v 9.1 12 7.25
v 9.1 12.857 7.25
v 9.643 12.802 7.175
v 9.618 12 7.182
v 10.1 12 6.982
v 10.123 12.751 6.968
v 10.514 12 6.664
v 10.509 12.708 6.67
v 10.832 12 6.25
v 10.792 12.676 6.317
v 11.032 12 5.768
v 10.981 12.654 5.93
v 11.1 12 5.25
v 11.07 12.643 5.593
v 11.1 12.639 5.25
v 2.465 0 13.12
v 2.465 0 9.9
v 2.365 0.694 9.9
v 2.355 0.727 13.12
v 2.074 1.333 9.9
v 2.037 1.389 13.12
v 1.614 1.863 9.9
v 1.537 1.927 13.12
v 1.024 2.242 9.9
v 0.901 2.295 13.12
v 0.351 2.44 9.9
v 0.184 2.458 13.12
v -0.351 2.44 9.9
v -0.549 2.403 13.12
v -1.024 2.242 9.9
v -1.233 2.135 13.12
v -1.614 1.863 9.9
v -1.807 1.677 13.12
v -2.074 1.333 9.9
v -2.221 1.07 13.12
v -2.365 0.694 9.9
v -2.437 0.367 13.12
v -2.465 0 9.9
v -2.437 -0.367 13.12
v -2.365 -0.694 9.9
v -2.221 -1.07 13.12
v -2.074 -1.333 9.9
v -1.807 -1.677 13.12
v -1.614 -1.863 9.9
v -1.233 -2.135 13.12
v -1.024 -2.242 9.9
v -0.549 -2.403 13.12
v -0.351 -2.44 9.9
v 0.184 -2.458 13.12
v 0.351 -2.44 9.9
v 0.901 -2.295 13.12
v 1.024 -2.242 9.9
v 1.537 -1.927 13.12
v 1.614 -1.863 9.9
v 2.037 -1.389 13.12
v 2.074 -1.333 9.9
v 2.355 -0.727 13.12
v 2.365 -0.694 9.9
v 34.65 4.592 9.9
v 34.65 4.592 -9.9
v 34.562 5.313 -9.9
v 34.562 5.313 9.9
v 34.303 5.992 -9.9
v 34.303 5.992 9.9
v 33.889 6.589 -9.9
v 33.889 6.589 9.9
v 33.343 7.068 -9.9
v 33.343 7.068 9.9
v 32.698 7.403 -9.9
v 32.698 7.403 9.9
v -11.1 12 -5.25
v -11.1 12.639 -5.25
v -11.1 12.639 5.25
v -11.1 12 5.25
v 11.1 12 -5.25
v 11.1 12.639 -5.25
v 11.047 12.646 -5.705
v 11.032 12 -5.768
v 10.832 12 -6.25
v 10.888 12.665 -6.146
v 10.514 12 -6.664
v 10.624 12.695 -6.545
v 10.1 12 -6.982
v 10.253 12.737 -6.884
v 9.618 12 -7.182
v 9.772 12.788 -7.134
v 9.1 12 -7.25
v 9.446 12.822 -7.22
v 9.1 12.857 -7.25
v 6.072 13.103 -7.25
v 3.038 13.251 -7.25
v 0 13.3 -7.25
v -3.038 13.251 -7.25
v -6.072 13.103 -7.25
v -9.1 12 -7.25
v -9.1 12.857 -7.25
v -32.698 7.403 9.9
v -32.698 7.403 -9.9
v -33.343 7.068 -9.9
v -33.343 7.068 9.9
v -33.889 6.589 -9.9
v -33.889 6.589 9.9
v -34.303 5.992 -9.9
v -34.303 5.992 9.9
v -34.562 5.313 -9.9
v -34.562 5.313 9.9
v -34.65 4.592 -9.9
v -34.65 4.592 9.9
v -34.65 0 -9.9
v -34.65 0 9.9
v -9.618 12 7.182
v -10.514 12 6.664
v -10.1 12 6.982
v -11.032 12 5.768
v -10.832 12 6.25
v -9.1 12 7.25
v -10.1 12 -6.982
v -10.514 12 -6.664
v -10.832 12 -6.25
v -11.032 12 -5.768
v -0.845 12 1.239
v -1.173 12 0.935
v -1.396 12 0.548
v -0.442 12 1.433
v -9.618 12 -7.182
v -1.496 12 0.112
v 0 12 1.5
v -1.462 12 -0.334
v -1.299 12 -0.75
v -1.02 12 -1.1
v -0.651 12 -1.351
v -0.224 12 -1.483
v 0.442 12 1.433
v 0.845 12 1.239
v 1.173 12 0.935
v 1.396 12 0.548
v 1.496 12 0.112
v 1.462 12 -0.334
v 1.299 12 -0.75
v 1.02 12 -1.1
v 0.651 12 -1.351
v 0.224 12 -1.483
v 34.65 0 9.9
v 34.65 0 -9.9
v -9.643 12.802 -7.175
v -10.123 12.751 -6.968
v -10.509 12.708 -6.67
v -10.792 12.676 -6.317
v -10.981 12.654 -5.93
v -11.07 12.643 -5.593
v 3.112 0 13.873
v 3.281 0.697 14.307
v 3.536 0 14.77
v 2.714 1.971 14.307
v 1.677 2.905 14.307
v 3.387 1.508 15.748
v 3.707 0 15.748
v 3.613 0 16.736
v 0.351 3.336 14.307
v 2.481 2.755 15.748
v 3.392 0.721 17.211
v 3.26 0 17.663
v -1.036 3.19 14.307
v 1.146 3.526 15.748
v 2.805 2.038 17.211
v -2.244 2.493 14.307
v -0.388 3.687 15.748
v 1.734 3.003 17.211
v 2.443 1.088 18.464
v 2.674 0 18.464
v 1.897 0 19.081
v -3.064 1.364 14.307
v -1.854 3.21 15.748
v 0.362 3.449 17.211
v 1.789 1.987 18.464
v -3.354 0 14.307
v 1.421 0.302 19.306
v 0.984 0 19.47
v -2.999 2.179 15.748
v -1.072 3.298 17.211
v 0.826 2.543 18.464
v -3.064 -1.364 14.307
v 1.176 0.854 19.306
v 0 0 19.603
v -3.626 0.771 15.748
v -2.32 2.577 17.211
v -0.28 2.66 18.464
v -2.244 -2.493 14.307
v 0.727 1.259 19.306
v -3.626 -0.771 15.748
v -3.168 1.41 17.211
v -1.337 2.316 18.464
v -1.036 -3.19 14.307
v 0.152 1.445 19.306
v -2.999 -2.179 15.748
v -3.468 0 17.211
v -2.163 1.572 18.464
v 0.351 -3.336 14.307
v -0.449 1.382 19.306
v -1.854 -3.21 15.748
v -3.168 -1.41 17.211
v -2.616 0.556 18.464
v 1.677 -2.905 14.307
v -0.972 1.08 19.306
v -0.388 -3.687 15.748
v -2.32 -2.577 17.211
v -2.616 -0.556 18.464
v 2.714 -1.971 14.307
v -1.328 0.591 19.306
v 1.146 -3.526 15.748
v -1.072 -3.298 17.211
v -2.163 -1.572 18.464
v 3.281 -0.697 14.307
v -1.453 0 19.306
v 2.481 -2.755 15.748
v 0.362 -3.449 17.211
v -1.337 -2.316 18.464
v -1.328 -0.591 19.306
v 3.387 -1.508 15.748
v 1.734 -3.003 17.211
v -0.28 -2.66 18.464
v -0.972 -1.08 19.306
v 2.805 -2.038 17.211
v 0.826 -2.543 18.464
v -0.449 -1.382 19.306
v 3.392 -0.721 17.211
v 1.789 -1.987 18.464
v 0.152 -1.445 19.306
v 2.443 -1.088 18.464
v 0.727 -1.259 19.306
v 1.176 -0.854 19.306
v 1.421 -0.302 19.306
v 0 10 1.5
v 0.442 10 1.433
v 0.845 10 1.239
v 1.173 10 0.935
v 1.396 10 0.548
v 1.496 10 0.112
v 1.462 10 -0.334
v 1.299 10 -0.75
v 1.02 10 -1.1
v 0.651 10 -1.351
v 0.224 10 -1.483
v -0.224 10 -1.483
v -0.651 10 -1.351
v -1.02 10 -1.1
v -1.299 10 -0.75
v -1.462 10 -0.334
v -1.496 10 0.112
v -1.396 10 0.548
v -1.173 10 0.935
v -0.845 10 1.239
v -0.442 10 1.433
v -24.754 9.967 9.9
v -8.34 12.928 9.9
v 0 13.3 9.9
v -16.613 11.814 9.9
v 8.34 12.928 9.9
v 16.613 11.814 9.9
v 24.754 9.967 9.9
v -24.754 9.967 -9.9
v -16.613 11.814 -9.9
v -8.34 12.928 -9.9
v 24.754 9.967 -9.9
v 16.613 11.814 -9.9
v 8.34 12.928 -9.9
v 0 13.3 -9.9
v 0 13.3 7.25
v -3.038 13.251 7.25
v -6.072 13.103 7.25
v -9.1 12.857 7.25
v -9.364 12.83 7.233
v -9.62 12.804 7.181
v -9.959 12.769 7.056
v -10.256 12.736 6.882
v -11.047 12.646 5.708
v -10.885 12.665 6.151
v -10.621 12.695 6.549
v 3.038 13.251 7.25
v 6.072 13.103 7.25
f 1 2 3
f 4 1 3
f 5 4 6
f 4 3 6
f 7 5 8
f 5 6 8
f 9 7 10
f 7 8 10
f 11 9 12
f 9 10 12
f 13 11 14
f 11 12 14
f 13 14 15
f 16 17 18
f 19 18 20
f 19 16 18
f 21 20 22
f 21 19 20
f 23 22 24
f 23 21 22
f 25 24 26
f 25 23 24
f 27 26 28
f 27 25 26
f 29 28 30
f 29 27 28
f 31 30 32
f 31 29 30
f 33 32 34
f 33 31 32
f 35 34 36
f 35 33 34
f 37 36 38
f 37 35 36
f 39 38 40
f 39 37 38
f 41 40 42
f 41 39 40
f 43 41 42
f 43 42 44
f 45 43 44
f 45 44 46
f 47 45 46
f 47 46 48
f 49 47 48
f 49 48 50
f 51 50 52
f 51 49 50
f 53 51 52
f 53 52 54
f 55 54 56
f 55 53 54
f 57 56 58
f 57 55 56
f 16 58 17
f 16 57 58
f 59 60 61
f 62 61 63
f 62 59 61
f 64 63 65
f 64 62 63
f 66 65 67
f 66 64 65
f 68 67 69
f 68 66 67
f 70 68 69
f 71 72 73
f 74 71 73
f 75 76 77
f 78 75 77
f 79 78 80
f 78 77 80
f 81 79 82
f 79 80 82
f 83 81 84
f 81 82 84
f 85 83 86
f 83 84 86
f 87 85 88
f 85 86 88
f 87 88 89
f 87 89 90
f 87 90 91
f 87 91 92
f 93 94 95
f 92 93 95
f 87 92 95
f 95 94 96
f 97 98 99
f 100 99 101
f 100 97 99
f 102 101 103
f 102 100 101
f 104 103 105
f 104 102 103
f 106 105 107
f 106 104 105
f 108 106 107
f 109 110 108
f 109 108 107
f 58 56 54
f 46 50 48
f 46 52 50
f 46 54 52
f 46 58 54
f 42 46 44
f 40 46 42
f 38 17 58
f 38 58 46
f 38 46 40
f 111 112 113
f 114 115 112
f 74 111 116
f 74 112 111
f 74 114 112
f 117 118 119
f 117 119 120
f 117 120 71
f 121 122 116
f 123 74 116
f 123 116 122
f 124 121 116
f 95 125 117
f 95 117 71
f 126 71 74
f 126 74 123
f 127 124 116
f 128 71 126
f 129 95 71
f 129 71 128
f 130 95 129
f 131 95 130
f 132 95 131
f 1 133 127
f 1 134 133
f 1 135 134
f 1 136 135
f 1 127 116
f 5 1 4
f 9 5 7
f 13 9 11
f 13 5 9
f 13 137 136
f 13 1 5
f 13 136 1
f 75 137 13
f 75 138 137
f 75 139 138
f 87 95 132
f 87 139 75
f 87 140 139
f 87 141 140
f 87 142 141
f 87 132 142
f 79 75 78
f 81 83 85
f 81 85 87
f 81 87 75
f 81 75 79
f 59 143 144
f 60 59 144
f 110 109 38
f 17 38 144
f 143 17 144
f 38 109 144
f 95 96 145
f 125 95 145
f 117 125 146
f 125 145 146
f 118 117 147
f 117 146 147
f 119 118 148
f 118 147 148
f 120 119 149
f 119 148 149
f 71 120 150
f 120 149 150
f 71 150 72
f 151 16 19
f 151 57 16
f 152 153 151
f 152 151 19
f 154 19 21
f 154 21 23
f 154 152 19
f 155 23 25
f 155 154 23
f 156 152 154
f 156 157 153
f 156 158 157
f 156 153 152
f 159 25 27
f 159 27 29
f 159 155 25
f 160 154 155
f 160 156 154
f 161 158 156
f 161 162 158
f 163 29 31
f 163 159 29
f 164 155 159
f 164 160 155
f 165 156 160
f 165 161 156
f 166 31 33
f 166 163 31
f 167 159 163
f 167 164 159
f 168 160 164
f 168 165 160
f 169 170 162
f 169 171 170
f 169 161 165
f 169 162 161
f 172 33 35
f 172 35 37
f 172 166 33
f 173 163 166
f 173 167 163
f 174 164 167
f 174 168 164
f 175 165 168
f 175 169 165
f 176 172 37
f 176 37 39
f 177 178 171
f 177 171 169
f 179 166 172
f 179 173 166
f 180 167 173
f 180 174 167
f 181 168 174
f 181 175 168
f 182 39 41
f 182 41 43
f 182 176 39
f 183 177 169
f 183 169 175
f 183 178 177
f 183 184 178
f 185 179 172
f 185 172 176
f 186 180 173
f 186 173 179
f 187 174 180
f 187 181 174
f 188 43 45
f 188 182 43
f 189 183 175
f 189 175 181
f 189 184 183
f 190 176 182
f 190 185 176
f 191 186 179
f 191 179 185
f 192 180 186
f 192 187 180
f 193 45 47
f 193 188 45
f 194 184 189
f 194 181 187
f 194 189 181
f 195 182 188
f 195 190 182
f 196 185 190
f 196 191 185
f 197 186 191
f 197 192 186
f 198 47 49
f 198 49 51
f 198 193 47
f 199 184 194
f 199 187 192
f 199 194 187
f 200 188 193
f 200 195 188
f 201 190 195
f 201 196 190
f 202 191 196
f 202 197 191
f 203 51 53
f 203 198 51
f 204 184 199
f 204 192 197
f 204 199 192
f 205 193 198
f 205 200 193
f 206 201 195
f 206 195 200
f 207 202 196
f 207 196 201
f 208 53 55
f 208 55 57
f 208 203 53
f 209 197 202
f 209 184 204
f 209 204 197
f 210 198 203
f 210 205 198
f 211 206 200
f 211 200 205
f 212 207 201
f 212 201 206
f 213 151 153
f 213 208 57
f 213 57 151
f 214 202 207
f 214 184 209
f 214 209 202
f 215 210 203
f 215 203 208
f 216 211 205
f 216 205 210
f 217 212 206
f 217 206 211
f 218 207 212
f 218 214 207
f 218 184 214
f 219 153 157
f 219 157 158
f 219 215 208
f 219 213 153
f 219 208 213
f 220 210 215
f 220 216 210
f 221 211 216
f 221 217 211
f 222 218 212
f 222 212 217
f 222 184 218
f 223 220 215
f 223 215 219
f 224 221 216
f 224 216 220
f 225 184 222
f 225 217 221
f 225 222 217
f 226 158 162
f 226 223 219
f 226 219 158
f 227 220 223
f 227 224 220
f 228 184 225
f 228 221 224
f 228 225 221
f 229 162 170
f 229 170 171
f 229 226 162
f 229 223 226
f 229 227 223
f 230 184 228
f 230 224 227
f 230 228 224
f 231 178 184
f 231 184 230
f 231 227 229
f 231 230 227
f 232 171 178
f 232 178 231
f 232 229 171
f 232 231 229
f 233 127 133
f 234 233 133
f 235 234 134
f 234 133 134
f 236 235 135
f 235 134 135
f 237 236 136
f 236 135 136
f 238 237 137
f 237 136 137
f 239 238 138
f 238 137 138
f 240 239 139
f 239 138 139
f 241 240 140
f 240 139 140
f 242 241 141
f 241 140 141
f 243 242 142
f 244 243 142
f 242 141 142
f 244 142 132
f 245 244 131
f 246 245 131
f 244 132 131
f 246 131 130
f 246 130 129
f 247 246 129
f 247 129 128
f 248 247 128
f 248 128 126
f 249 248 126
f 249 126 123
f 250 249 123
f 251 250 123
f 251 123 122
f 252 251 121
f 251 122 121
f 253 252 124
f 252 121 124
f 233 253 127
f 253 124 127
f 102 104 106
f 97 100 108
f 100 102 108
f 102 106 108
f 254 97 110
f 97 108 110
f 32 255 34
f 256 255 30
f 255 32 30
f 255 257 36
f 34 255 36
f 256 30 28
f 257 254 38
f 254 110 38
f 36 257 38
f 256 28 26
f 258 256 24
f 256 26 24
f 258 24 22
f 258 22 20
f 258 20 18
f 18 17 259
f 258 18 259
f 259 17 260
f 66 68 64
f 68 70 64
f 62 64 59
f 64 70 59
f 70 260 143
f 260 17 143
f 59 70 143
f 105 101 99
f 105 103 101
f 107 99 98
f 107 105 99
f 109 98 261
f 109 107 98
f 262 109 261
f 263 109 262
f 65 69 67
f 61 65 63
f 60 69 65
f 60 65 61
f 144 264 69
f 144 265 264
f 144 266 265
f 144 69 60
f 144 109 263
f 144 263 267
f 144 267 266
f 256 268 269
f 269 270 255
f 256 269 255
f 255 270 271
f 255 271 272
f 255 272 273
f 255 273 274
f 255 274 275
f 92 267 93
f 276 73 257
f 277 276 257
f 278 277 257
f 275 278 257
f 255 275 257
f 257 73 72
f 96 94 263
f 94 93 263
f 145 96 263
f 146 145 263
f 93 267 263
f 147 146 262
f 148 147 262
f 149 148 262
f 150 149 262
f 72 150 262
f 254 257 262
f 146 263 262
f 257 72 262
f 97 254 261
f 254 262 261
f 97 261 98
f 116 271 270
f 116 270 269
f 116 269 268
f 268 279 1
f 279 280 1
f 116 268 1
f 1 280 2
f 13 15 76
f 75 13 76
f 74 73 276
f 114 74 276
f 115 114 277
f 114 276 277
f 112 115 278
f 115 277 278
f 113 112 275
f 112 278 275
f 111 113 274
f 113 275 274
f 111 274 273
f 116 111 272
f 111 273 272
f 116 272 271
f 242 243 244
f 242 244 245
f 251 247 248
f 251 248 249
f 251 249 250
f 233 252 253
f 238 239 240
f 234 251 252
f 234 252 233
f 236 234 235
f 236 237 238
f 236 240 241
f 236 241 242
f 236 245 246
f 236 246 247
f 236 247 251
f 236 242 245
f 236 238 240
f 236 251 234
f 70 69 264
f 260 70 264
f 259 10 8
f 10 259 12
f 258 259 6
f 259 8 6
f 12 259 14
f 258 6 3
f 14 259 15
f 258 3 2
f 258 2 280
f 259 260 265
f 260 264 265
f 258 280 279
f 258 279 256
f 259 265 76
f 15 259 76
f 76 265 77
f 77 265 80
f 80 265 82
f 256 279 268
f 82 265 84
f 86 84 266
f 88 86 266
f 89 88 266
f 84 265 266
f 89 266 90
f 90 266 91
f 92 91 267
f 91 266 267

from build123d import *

# Parameters (mm, degrees)
SKETCH1_W           = 69.3
SKETCH1_H           = 19.8
BOSS_EXTRUDE1_DEPTH = 13.3
CUT_EXTRUDE1_DEPTH  = 48.412254857
CUT_EXTRUDE2_DEPTH  = 3
SKETCH5_R           = 1.5
CUT_EXTRUDE3_DEPTH  = 2
FILLET1_R           = 3


with BuildPart() as part:
    # Sketch1 → Boss-Extrude1 (new body)
    with BuildSketch(Plane(origin=(0, 0, 0), x_dir=(1, 0, 0), z_dir=(0, 1, 0))):
        Rectangle(SKETCH1_W, SKETCH1_H)
    extrude(amount=BOSS_EXTRUDE1_DEPTH)

    # Sketch2 → Revolve1 (revolve)
    with BuildSketch(Plane(origin=(0, 0, 0), x_dir=(1, 0, 0), z_dir=(0, 1, 0))):
        with BuildLine():
            Line((2.465, -9.9), (2.465, -13.12))
            ThreePointArc((2.465, -13.12), (3.467767545, -17.211295036), (0, -19.602701751))
            Line((0, -19.602701751), (0, -9.9))
            Line((0, -9.9), (2.465, -9.9))
        make_face()
    revolve(axis=Axis((0, 0, 0), (0, 0, 1)))

    # Sketch3 → Cut-Extrude1 (cut, through all)
    with BuildSketch(Plane(origin=(0, 0, -9.9), x_dir=(-1, 0, 0), z_dir=(0, 0, -1))):
        with BuildLine():
            Line((-34.65, 13.3), (-34.65, 6.65))
            ThreePointArc((-34.65, 6.65), (-17.641180346, 11.622466932), (3.46e-07, 13.3))
            Line((3.46e-07, 13.3), (-34.65, 13.3))
        make_face()
        with BuildLine():
            ThreePointArc((3.46e-07, 13.3), (17.641180686, 11.622466867), (34.65, 6.65))
            Line((34.65, 6.65), (34.65, 13.3))
            Line((34.65, 13.3), (3.46e-07, 13.3))
        make_face()
    extrude(amount=-CUT_EXTRUDE1_DEPTH, mode=Mode.SUBTRACT)

    # Sketch4 → Cut-Extrude2 (cut)
    with BuildSketch(Plane(origin=(0, 15, 0), x_dir=(1, 0, 0), z_dir=(0, 1, 0))):
        with BuildLine():
            Line((-9.1, -7.25), (9.1, -7.25))
            ThreePointArc((9.1, -7.25), (10.514213562, -6.664213562), (11.1, -5.25))
            Line((11.1, -5.25), (11.1, 5.25))
            ThreePointArc((11.1, 5.25), (10.514213562, 6.664213562), (9.1, 7.25))
            Line((9.1, 7.25), (-9.1, 7.25))
            ThreePointArc((-9.1, 7.25), (-10.514213562, 6.664213562), (-11.1, 5.25))
            Line((-11.1, 5.25), (-11.1, -5.25))
            ThreePointArc((-11.1, -5.25), (-10.514213562, -6.664213562), (-9.1, -7.25))
        make_face()
    extrude(amount=-CUT_EXTRUDE2_DEPTH, mode=Mode.SUBTRACT)

    # Sketch5 → Cut-Extrude3 (cut)
    with BuildSketch(Plane(origin=(0, 12, 0), x_dir=(1, 0, 0), z_dir=(0, 1, 0))):
        with Locations(Location((0, 0, 0), (0, 0, 270))):
            Circle(SKETCH5_R)
    extrude(amount=-CUT_EXTRUDE3_DEPTH, mode=Mode.SUBTRACT)

    # Fillet1
    fillet1_edges = [part.edges().sort_by_distance(p)[0] for p in [
        (34.65, 6.65, 0),
        (-34.65, 6.65, 0),
    ]]
    fillet(fillet1_edges, radius=FILLET1_R)


solid = part.part
